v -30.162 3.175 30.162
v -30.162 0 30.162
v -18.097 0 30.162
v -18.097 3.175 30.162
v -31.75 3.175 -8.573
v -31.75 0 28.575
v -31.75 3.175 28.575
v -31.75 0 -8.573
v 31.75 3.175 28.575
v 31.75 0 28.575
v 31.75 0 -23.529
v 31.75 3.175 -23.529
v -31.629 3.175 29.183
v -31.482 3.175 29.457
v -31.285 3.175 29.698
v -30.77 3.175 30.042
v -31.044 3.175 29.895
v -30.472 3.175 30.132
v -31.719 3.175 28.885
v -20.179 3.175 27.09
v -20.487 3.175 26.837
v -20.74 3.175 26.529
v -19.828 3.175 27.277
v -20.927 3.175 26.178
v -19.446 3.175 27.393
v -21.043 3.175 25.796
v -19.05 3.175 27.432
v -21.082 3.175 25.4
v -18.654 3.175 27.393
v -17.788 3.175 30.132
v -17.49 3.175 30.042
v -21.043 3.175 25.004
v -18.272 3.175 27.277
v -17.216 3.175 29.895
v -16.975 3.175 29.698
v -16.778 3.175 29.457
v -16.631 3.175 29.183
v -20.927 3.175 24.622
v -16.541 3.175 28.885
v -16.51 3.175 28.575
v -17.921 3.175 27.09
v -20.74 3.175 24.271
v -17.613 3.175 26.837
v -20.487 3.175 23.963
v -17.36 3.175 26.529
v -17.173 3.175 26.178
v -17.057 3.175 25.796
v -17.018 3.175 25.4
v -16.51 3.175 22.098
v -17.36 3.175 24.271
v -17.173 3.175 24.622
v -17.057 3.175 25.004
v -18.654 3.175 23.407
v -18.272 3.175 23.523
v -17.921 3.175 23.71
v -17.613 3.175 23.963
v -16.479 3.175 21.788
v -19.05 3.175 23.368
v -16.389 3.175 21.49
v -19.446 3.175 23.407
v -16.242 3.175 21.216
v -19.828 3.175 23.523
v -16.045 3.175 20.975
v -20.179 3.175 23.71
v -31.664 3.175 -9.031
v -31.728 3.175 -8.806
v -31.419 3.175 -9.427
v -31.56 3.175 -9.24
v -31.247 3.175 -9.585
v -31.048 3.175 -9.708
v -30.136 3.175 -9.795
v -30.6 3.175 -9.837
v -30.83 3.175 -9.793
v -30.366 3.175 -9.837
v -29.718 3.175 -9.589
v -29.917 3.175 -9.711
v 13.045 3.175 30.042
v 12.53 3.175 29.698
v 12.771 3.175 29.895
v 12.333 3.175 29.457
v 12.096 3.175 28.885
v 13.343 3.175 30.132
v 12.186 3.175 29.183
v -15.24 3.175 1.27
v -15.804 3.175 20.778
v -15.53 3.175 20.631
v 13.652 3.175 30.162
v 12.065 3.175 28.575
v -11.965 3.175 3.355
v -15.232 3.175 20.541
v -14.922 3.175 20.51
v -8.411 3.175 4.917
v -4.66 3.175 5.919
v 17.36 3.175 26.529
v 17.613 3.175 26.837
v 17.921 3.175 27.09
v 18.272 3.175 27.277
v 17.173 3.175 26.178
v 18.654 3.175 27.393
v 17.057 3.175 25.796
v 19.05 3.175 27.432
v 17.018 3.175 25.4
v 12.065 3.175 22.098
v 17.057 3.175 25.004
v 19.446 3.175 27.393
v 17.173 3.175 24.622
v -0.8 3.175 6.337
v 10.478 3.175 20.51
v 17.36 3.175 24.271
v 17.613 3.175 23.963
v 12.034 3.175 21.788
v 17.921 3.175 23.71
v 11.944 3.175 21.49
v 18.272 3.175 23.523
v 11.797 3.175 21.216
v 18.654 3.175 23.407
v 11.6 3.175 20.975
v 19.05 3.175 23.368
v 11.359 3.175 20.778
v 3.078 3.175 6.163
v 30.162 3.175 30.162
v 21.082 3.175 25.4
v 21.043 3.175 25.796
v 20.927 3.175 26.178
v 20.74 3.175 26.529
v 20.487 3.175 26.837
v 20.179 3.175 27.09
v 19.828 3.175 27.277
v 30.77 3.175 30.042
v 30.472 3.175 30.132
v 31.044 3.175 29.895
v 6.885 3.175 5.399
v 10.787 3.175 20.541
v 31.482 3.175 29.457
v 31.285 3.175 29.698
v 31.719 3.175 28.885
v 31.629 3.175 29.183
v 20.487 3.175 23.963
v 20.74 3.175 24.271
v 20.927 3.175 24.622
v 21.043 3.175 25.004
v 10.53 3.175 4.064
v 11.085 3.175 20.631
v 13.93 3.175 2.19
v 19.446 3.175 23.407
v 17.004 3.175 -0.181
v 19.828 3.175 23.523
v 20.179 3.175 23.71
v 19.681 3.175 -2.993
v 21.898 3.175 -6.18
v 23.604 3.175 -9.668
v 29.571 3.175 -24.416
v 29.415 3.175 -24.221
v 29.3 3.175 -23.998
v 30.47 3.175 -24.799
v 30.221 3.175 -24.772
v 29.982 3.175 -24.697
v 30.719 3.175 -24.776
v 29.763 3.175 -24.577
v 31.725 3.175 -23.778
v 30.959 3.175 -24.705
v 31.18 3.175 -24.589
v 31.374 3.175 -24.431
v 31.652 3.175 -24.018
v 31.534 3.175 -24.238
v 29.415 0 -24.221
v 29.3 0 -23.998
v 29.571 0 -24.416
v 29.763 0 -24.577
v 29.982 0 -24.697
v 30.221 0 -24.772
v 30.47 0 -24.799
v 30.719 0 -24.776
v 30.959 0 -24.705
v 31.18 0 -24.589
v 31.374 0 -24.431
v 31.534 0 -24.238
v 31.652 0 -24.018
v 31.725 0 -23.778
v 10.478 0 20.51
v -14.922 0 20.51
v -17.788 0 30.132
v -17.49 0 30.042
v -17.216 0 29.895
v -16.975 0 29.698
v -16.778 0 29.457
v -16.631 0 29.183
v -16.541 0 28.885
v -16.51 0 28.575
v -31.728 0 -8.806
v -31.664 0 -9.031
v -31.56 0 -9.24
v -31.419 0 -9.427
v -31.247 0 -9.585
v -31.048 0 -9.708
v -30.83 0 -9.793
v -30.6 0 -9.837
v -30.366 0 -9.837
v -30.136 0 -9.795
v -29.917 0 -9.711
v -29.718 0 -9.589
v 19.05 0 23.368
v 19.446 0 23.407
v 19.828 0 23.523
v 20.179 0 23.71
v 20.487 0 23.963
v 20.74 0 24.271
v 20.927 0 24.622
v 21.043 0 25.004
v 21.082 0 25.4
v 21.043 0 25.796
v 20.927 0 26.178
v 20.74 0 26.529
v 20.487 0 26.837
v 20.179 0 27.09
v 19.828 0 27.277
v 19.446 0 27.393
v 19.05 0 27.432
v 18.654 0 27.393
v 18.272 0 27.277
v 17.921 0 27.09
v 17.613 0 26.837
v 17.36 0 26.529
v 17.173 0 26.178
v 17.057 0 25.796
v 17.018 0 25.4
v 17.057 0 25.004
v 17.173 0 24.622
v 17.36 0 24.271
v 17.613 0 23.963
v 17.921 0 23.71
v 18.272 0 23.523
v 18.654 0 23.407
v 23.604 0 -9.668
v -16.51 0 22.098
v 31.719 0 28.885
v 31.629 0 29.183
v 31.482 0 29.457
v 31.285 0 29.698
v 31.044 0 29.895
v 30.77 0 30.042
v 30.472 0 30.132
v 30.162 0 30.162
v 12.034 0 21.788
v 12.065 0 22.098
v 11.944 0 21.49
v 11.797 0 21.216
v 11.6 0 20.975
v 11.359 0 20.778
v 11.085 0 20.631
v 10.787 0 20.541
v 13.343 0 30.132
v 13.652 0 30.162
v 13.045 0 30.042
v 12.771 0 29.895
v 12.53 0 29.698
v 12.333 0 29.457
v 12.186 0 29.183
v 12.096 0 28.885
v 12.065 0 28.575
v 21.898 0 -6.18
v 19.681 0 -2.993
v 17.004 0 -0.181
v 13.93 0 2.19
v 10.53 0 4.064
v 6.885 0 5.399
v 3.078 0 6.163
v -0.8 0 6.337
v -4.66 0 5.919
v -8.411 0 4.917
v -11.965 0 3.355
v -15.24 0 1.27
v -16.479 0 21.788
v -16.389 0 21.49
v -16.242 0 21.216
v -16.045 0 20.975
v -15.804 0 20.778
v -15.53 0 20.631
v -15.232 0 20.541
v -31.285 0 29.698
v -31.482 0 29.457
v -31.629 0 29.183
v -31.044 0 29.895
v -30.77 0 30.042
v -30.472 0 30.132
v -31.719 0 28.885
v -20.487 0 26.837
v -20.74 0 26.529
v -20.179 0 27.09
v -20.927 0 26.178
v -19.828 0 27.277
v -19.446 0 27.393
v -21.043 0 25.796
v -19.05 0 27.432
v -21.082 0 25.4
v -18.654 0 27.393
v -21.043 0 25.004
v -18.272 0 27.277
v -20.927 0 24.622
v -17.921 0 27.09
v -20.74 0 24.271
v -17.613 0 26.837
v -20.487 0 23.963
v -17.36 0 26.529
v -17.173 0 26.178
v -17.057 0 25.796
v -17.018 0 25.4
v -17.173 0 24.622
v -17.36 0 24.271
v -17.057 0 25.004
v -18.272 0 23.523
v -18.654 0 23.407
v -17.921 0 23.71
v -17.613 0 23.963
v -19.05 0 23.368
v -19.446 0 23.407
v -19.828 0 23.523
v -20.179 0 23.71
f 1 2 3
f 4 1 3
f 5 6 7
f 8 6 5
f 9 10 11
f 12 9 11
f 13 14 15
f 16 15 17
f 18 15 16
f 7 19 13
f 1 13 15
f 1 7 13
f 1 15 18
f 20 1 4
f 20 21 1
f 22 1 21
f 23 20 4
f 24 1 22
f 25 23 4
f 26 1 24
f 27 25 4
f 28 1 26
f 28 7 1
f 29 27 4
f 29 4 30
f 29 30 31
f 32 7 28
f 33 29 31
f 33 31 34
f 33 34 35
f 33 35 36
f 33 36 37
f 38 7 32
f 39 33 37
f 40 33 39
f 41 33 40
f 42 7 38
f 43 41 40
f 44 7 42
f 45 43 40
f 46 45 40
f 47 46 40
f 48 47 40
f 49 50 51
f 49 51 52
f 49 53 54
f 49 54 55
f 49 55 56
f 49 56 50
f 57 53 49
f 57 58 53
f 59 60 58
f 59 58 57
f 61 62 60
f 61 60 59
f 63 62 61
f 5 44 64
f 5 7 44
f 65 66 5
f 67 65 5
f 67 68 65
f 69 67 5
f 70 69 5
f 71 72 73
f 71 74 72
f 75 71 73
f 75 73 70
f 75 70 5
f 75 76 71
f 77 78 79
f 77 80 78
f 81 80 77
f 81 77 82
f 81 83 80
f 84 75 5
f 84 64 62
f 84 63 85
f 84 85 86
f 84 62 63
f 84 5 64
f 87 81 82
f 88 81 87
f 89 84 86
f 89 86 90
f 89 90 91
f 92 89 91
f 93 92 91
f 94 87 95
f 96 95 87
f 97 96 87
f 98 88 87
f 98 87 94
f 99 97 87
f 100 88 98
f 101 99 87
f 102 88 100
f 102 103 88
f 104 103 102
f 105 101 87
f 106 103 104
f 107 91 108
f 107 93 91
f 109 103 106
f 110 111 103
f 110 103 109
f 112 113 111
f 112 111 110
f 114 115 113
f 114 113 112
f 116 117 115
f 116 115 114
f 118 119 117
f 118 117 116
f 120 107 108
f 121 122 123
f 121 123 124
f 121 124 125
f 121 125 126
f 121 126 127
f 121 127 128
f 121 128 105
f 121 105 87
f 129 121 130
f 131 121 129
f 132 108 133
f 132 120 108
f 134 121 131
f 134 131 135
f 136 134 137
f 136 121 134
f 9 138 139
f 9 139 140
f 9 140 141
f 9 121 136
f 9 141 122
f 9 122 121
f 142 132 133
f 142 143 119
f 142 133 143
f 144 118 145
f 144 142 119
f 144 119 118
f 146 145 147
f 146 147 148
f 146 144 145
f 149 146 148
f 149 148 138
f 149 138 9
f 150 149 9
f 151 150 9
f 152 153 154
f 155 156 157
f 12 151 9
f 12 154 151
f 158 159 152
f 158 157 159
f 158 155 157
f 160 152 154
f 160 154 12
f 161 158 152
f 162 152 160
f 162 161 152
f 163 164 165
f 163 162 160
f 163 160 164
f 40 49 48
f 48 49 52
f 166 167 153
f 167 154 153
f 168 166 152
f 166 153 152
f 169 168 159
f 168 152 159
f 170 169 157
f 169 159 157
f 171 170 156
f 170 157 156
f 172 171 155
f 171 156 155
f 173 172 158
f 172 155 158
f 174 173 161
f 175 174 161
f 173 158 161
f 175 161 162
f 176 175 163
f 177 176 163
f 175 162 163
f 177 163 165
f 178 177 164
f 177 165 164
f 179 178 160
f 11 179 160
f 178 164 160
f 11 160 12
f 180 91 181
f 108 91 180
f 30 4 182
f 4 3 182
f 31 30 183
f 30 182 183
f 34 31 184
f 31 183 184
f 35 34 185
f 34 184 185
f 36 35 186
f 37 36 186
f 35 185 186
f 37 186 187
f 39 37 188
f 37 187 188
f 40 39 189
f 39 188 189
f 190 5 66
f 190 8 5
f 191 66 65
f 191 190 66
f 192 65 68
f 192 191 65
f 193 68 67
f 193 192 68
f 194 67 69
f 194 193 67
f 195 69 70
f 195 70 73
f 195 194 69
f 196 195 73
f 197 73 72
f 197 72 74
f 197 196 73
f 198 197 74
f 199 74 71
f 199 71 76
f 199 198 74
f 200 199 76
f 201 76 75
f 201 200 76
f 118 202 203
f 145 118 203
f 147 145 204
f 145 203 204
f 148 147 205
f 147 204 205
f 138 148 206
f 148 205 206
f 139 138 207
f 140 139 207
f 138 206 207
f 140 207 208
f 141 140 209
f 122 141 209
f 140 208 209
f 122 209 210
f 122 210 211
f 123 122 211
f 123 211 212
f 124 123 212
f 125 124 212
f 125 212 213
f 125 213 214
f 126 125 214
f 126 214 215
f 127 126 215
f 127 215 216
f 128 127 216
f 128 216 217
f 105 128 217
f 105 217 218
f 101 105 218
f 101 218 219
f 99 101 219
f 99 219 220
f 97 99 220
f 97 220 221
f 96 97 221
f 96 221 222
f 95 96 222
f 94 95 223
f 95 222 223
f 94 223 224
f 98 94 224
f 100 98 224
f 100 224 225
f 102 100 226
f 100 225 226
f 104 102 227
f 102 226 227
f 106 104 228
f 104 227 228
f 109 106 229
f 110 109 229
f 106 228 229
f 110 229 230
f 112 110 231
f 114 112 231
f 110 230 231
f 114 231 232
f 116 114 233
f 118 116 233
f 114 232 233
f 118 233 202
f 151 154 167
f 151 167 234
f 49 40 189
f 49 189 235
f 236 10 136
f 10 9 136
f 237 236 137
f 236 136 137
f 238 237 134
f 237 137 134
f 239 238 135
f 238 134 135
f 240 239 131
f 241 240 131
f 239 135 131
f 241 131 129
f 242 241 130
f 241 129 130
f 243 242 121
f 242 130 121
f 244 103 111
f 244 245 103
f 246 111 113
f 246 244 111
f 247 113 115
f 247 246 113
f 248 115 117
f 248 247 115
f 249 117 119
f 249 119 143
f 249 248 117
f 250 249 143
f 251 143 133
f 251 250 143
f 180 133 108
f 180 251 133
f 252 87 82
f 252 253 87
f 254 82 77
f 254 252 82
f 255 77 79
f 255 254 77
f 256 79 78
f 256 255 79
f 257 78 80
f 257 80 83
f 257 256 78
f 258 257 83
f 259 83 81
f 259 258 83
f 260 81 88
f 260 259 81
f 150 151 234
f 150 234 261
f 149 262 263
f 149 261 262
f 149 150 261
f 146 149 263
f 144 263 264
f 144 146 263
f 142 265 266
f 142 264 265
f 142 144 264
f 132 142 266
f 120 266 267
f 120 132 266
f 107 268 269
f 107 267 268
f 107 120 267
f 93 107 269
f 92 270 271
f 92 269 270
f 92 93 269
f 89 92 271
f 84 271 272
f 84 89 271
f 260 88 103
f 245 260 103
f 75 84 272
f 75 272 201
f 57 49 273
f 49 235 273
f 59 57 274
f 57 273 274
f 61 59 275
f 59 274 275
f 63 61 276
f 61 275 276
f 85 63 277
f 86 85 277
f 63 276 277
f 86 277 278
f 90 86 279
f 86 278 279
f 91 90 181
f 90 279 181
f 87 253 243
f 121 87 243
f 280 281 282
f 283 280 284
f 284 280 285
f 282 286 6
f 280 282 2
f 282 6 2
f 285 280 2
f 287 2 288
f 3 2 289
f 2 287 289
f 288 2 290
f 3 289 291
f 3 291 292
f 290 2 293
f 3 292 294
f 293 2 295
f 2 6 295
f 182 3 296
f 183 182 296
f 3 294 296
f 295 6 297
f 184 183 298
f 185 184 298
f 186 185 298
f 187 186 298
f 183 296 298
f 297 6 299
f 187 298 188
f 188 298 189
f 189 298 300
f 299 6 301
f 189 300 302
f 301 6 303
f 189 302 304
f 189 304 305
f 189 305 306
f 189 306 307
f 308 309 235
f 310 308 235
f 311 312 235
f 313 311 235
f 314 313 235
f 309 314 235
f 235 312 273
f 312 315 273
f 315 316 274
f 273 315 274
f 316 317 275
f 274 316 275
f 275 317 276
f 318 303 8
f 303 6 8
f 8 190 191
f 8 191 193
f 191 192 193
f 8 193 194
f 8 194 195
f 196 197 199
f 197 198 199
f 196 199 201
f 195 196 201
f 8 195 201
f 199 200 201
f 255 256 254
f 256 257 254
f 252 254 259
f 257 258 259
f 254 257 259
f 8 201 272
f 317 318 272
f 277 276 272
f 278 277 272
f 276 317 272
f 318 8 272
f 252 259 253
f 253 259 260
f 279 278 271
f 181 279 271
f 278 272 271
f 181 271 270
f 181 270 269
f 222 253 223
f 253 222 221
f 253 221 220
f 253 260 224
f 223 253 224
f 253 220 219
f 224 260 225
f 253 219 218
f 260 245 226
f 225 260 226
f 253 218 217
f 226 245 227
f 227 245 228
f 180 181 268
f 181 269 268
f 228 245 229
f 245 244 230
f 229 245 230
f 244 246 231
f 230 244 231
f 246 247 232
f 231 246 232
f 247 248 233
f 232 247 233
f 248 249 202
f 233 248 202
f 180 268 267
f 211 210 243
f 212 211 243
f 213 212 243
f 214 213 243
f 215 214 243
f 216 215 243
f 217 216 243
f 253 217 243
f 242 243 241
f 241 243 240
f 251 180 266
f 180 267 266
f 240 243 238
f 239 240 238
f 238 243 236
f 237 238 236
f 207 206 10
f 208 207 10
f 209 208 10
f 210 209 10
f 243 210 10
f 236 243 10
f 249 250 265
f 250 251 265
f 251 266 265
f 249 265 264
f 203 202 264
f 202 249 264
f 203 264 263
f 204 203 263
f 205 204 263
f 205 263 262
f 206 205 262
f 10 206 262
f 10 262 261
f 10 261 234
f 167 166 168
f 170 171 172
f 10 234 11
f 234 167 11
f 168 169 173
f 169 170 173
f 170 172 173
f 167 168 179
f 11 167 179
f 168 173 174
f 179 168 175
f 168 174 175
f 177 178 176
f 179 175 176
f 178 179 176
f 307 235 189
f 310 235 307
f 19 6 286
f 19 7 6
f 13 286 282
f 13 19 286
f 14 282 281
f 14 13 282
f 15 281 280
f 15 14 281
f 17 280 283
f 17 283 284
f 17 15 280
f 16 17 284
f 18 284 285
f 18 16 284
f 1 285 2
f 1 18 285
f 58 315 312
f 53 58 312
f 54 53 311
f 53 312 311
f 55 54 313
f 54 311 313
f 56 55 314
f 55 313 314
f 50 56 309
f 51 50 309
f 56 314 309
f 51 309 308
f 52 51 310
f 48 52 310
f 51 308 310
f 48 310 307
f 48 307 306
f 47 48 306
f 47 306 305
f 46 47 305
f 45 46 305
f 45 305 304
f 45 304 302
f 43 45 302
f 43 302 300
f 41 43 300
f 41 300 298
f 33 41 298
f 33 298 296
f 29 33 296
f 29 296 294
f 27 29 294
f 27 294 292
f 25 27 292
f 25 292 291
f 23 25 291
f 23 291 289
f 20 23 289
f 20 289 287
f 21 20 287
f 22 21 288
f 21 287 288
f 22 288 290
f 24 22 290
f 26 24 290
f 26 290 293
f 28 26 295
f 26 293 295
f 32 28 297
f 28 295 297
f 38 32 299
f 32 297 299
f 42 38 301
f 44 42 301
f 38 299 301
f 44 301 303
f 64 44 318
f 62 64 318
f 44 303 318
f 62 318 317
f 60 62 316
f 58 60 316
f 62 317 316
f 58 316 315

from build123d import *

# Parameters (mm, degrees)
SKETCH1_W           = 63.5
SKETCH1_H           = 60.325
BOSS_EXTRUDE1_DEPTH = 3.175
SKETCH2_R           = 2.032
CUT_EXTRUDE1_DEPTH  = 44.908080478
SKETCH3_W           = 28.575
SKETCH3_H           = 9.652
CUT_EXTRUDE2_DEPTH  = 44.908080478
FILLET1_R           = 1.5875
CUT_EXTRUDE4_DEPTH  = 44.908080478
FILLET2_R           = 1.27


with BuildPart() as part:
    # Sketch1 → Boss-Extrude1 (new body)
    with BuildSketch(Plane(origin=(0, 0, 0), x_dir=(1, 0, 0), z_dir=(0, 1, 0))):
        Rectangle(SKETCH1_W, SKETCH1_H)
    extrude(amount=BOSS_EXTRUDE1_DEPTH)

    # Sketch2 → Cut-Extrude1 (cut, through all)
    with BuildSketch(Plane(origin=(0, 0, 0), x_dir=(-1, 0, 0), z_dir=(0, -1, 0))):
        with Locations(Location((-19.05, -25.4, 0), (0, 0, 90))):
            Circle(SKETCH2_R)
        with Locations(Location((19.05, -25.4, 0), (0, 0, 90))):
            Circle(SKETCH2_R)
    extrude(amount=-CUT_EXTRUDE1_DEPTH, mode=Mode.SUBTRACT)

    # Sketch3 → Cut-Extrude2 (cut, through all)
    with BuildSketch(Plane(origin=(0, 3.175, 0), x_dir=(1, 0, 0), z_dir=(0, 1, 0))):
        with Locations((-2.2225, -25.3365)):
            Rectangle(SKETCH3_W, SKETCH3_H)
    extrude(amount=-CUT_EXTRUDE2_DEPTH, mode=Mode.SUBTRACT)

    # Fillet1
    fillet1_edges = [part.edges().sort_by_distance(p)[0] for p in [
        (-16.51, 1.5875, 30.1625),
        (-16.51, 1.5875, 20.5105),
        (12.065, 1.5875, 20.5105),
        (12.065, 1.5875, 30.1625),
        (31.75, 1.5875, 30.1625),
        (-31.75, 1.5875, 30.1625),
    ]]
    fillet(fillet1_edges, radius=FILLET1_R)

    # Sketch5 → Cut-Extrude4 (cut, through all)
    with BuildSketch(Plane(origin=(0, 3.175, 0), x_dir=(1, 0, 0), z_dir=(0, 1, 0))):
        with BuildLine():
            Line((-15.24, -1.27), (-31.75, 11.1125))
            Line((-31.75, 11.1125), (-31.75, 30.1625))
            Line((-31.75, 30.1625), (31.75, 30.1625))
            Line((31.75, 30.1625), (23.603733945, 9.667903014))
            ThreePointArc((23.603733945, 9.667903014), (6.884580014, -5.399183177), (-15.24, -1.27))
        make_face()
    extrude(amount=-CUT_EXTRUDE4_DEPTH, mode=Mode.SUBTRACT)

    # Fillet2
    fillet2_edges = [part.edges().sort_by_distance(p)[0] for p in [
        (31.75, 1.5875, -30.1625),
        (-31.75, 1.5875, -11.1125),
    ]]
    fillet(fillet2_edges, radius=FILLET2_R)


solid = part.part
